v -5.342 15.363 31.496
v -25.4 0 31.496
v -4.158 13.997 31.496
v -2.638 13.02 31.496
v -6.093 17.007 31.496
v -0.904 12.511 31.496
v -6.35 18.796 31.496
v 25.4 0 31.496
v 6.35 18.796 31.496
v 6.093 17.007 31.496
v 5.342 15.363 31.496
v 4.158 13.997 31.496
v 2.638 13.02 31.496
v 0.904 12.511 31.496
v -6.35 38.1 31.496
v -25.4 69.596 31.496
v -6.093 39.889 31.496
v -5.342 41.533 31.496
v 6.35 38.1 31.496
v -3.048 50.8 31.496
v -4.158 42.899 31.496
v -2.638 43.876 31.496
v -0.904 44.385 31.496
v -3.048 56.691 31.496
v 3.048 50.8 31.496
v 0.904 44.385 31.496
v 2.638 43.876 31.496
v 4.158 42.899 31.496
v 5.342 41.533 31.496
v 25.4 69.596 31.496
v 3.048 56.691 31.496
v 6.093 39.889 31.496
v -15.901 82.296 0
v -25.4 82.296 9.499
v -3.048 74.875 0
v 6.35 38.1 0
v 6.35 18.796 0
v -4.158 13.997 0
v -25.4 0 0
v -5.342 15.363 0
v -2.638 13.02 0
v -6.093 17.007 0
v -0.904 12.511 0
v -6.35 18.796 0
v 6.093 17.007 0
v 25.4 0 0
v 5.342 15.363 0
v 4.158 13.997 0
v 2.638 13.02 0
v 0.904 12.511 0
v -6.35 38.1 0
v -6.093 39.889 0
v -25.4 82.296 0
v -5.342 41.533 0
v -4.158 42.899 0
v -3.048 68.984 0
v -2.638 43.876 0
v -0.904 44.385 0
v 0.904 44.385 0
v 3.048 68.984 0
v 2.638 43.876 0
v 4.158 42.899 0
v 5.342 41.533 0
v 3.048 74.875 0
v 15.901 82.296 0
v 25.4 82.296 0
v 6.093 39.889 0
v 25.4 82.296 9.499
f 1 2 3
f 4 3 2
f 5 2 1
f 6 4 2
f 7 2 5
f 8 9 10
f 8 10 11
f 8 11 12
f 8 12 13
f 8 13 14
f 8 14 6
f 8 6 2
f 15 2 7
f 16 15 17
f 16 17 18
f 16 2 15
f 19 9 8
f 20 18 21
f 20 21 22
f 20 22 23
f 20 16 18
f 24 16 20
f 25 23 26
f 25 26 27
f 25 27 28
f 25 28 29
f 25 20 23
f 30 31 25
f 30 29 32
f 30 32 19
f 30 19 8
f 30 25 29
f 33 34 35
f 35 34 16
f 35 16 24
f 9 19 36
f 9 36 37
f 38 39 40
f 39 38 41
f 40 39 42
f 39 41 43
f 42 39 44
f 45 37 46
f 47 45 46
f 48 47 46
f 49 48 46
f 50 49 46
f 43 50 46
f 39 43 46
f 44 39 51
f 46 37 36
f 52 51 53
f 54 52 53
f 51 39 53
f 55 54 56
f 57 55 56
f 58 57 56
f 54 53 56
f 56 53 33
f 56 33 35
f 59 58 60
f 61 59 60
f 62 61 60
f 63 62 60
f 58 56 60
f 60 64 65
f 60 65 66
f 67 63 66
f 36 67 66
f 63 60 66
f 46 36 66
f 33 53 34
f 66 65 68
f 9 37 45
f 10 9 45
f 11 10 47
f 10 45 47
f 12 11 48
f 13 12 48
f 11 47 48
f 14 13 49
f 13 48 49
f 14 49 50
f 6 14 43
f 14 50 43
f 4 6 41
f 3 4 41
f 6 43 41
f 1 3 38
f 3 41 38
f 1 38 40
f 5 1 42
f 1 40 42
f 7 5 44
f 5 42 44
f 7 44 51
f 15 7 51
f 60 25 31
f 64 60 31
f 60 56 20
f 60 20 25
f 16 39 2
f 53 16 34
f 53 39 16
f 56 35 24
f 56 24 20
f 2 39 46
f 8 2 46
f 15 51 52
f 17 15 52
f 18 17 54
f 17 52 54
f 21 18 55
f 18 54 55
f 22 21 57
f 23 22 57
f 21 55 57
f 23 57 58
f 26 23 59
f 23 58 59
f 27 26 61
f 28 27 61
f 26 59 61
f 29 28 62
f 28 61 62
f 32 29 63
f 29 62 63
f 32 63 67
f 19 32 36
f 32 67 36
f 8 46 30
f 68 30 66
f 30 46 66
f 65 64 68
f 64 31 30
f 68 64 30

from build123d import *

# Parameters (mm, degrees)
SKETCH1_W           = 50.8
SKETCH1_H           = 82.296
BOSS_EXTRUDE1_DEPTH = 31.496
CUT_EXTRUDE1_DEPTH  = 37.523148695


with BuildPart() as part:
    # Sketch1 → Boss-Extrude1 (new body)
    with BuildSketch(Plane.XY):
        with Locations((0, 41.148)):
            Rectangle(SKETCH1_W, SKETCH1_H)
        with BuildLine():
            Line((6.35, 38.1), (6.35, 18.796))
            ThreePointArc((6.35, 18.796), (0, 12.446), (-6.35, 18.796))
            Line((-6.35, 18.796), (-6.35, 38.1))
            ThreePointArc((-6.35, 38.1), (0, 44.45), (6.35, 38.1))
        make_face(mode=Mode.SUBTRACT)
    extrude(amount=BOSS_EXTRUDE1_DEPTH)

    # Sketch2 → Cut-Extrude1 (cut, through all, along a direction that is not the sketch's normal)
    with BuildSketch(Plane.XY.offset(31.496)):
        Polygon((-25.4, 69.596), (-3.048, 56.691066783), (-3.048, 50.8), (3.048, 50.8), (3.048, 56.691066783), (25.4, 69.596), (25.4, 82.296), (-25.4, 82.296), align=None)
    extrude(amount=-CUT_EXTRUDE1_DEPTH, dir=(0, -0.5, 0.866025404), mode=Mode.SUBTRACT)


solid = part.part
